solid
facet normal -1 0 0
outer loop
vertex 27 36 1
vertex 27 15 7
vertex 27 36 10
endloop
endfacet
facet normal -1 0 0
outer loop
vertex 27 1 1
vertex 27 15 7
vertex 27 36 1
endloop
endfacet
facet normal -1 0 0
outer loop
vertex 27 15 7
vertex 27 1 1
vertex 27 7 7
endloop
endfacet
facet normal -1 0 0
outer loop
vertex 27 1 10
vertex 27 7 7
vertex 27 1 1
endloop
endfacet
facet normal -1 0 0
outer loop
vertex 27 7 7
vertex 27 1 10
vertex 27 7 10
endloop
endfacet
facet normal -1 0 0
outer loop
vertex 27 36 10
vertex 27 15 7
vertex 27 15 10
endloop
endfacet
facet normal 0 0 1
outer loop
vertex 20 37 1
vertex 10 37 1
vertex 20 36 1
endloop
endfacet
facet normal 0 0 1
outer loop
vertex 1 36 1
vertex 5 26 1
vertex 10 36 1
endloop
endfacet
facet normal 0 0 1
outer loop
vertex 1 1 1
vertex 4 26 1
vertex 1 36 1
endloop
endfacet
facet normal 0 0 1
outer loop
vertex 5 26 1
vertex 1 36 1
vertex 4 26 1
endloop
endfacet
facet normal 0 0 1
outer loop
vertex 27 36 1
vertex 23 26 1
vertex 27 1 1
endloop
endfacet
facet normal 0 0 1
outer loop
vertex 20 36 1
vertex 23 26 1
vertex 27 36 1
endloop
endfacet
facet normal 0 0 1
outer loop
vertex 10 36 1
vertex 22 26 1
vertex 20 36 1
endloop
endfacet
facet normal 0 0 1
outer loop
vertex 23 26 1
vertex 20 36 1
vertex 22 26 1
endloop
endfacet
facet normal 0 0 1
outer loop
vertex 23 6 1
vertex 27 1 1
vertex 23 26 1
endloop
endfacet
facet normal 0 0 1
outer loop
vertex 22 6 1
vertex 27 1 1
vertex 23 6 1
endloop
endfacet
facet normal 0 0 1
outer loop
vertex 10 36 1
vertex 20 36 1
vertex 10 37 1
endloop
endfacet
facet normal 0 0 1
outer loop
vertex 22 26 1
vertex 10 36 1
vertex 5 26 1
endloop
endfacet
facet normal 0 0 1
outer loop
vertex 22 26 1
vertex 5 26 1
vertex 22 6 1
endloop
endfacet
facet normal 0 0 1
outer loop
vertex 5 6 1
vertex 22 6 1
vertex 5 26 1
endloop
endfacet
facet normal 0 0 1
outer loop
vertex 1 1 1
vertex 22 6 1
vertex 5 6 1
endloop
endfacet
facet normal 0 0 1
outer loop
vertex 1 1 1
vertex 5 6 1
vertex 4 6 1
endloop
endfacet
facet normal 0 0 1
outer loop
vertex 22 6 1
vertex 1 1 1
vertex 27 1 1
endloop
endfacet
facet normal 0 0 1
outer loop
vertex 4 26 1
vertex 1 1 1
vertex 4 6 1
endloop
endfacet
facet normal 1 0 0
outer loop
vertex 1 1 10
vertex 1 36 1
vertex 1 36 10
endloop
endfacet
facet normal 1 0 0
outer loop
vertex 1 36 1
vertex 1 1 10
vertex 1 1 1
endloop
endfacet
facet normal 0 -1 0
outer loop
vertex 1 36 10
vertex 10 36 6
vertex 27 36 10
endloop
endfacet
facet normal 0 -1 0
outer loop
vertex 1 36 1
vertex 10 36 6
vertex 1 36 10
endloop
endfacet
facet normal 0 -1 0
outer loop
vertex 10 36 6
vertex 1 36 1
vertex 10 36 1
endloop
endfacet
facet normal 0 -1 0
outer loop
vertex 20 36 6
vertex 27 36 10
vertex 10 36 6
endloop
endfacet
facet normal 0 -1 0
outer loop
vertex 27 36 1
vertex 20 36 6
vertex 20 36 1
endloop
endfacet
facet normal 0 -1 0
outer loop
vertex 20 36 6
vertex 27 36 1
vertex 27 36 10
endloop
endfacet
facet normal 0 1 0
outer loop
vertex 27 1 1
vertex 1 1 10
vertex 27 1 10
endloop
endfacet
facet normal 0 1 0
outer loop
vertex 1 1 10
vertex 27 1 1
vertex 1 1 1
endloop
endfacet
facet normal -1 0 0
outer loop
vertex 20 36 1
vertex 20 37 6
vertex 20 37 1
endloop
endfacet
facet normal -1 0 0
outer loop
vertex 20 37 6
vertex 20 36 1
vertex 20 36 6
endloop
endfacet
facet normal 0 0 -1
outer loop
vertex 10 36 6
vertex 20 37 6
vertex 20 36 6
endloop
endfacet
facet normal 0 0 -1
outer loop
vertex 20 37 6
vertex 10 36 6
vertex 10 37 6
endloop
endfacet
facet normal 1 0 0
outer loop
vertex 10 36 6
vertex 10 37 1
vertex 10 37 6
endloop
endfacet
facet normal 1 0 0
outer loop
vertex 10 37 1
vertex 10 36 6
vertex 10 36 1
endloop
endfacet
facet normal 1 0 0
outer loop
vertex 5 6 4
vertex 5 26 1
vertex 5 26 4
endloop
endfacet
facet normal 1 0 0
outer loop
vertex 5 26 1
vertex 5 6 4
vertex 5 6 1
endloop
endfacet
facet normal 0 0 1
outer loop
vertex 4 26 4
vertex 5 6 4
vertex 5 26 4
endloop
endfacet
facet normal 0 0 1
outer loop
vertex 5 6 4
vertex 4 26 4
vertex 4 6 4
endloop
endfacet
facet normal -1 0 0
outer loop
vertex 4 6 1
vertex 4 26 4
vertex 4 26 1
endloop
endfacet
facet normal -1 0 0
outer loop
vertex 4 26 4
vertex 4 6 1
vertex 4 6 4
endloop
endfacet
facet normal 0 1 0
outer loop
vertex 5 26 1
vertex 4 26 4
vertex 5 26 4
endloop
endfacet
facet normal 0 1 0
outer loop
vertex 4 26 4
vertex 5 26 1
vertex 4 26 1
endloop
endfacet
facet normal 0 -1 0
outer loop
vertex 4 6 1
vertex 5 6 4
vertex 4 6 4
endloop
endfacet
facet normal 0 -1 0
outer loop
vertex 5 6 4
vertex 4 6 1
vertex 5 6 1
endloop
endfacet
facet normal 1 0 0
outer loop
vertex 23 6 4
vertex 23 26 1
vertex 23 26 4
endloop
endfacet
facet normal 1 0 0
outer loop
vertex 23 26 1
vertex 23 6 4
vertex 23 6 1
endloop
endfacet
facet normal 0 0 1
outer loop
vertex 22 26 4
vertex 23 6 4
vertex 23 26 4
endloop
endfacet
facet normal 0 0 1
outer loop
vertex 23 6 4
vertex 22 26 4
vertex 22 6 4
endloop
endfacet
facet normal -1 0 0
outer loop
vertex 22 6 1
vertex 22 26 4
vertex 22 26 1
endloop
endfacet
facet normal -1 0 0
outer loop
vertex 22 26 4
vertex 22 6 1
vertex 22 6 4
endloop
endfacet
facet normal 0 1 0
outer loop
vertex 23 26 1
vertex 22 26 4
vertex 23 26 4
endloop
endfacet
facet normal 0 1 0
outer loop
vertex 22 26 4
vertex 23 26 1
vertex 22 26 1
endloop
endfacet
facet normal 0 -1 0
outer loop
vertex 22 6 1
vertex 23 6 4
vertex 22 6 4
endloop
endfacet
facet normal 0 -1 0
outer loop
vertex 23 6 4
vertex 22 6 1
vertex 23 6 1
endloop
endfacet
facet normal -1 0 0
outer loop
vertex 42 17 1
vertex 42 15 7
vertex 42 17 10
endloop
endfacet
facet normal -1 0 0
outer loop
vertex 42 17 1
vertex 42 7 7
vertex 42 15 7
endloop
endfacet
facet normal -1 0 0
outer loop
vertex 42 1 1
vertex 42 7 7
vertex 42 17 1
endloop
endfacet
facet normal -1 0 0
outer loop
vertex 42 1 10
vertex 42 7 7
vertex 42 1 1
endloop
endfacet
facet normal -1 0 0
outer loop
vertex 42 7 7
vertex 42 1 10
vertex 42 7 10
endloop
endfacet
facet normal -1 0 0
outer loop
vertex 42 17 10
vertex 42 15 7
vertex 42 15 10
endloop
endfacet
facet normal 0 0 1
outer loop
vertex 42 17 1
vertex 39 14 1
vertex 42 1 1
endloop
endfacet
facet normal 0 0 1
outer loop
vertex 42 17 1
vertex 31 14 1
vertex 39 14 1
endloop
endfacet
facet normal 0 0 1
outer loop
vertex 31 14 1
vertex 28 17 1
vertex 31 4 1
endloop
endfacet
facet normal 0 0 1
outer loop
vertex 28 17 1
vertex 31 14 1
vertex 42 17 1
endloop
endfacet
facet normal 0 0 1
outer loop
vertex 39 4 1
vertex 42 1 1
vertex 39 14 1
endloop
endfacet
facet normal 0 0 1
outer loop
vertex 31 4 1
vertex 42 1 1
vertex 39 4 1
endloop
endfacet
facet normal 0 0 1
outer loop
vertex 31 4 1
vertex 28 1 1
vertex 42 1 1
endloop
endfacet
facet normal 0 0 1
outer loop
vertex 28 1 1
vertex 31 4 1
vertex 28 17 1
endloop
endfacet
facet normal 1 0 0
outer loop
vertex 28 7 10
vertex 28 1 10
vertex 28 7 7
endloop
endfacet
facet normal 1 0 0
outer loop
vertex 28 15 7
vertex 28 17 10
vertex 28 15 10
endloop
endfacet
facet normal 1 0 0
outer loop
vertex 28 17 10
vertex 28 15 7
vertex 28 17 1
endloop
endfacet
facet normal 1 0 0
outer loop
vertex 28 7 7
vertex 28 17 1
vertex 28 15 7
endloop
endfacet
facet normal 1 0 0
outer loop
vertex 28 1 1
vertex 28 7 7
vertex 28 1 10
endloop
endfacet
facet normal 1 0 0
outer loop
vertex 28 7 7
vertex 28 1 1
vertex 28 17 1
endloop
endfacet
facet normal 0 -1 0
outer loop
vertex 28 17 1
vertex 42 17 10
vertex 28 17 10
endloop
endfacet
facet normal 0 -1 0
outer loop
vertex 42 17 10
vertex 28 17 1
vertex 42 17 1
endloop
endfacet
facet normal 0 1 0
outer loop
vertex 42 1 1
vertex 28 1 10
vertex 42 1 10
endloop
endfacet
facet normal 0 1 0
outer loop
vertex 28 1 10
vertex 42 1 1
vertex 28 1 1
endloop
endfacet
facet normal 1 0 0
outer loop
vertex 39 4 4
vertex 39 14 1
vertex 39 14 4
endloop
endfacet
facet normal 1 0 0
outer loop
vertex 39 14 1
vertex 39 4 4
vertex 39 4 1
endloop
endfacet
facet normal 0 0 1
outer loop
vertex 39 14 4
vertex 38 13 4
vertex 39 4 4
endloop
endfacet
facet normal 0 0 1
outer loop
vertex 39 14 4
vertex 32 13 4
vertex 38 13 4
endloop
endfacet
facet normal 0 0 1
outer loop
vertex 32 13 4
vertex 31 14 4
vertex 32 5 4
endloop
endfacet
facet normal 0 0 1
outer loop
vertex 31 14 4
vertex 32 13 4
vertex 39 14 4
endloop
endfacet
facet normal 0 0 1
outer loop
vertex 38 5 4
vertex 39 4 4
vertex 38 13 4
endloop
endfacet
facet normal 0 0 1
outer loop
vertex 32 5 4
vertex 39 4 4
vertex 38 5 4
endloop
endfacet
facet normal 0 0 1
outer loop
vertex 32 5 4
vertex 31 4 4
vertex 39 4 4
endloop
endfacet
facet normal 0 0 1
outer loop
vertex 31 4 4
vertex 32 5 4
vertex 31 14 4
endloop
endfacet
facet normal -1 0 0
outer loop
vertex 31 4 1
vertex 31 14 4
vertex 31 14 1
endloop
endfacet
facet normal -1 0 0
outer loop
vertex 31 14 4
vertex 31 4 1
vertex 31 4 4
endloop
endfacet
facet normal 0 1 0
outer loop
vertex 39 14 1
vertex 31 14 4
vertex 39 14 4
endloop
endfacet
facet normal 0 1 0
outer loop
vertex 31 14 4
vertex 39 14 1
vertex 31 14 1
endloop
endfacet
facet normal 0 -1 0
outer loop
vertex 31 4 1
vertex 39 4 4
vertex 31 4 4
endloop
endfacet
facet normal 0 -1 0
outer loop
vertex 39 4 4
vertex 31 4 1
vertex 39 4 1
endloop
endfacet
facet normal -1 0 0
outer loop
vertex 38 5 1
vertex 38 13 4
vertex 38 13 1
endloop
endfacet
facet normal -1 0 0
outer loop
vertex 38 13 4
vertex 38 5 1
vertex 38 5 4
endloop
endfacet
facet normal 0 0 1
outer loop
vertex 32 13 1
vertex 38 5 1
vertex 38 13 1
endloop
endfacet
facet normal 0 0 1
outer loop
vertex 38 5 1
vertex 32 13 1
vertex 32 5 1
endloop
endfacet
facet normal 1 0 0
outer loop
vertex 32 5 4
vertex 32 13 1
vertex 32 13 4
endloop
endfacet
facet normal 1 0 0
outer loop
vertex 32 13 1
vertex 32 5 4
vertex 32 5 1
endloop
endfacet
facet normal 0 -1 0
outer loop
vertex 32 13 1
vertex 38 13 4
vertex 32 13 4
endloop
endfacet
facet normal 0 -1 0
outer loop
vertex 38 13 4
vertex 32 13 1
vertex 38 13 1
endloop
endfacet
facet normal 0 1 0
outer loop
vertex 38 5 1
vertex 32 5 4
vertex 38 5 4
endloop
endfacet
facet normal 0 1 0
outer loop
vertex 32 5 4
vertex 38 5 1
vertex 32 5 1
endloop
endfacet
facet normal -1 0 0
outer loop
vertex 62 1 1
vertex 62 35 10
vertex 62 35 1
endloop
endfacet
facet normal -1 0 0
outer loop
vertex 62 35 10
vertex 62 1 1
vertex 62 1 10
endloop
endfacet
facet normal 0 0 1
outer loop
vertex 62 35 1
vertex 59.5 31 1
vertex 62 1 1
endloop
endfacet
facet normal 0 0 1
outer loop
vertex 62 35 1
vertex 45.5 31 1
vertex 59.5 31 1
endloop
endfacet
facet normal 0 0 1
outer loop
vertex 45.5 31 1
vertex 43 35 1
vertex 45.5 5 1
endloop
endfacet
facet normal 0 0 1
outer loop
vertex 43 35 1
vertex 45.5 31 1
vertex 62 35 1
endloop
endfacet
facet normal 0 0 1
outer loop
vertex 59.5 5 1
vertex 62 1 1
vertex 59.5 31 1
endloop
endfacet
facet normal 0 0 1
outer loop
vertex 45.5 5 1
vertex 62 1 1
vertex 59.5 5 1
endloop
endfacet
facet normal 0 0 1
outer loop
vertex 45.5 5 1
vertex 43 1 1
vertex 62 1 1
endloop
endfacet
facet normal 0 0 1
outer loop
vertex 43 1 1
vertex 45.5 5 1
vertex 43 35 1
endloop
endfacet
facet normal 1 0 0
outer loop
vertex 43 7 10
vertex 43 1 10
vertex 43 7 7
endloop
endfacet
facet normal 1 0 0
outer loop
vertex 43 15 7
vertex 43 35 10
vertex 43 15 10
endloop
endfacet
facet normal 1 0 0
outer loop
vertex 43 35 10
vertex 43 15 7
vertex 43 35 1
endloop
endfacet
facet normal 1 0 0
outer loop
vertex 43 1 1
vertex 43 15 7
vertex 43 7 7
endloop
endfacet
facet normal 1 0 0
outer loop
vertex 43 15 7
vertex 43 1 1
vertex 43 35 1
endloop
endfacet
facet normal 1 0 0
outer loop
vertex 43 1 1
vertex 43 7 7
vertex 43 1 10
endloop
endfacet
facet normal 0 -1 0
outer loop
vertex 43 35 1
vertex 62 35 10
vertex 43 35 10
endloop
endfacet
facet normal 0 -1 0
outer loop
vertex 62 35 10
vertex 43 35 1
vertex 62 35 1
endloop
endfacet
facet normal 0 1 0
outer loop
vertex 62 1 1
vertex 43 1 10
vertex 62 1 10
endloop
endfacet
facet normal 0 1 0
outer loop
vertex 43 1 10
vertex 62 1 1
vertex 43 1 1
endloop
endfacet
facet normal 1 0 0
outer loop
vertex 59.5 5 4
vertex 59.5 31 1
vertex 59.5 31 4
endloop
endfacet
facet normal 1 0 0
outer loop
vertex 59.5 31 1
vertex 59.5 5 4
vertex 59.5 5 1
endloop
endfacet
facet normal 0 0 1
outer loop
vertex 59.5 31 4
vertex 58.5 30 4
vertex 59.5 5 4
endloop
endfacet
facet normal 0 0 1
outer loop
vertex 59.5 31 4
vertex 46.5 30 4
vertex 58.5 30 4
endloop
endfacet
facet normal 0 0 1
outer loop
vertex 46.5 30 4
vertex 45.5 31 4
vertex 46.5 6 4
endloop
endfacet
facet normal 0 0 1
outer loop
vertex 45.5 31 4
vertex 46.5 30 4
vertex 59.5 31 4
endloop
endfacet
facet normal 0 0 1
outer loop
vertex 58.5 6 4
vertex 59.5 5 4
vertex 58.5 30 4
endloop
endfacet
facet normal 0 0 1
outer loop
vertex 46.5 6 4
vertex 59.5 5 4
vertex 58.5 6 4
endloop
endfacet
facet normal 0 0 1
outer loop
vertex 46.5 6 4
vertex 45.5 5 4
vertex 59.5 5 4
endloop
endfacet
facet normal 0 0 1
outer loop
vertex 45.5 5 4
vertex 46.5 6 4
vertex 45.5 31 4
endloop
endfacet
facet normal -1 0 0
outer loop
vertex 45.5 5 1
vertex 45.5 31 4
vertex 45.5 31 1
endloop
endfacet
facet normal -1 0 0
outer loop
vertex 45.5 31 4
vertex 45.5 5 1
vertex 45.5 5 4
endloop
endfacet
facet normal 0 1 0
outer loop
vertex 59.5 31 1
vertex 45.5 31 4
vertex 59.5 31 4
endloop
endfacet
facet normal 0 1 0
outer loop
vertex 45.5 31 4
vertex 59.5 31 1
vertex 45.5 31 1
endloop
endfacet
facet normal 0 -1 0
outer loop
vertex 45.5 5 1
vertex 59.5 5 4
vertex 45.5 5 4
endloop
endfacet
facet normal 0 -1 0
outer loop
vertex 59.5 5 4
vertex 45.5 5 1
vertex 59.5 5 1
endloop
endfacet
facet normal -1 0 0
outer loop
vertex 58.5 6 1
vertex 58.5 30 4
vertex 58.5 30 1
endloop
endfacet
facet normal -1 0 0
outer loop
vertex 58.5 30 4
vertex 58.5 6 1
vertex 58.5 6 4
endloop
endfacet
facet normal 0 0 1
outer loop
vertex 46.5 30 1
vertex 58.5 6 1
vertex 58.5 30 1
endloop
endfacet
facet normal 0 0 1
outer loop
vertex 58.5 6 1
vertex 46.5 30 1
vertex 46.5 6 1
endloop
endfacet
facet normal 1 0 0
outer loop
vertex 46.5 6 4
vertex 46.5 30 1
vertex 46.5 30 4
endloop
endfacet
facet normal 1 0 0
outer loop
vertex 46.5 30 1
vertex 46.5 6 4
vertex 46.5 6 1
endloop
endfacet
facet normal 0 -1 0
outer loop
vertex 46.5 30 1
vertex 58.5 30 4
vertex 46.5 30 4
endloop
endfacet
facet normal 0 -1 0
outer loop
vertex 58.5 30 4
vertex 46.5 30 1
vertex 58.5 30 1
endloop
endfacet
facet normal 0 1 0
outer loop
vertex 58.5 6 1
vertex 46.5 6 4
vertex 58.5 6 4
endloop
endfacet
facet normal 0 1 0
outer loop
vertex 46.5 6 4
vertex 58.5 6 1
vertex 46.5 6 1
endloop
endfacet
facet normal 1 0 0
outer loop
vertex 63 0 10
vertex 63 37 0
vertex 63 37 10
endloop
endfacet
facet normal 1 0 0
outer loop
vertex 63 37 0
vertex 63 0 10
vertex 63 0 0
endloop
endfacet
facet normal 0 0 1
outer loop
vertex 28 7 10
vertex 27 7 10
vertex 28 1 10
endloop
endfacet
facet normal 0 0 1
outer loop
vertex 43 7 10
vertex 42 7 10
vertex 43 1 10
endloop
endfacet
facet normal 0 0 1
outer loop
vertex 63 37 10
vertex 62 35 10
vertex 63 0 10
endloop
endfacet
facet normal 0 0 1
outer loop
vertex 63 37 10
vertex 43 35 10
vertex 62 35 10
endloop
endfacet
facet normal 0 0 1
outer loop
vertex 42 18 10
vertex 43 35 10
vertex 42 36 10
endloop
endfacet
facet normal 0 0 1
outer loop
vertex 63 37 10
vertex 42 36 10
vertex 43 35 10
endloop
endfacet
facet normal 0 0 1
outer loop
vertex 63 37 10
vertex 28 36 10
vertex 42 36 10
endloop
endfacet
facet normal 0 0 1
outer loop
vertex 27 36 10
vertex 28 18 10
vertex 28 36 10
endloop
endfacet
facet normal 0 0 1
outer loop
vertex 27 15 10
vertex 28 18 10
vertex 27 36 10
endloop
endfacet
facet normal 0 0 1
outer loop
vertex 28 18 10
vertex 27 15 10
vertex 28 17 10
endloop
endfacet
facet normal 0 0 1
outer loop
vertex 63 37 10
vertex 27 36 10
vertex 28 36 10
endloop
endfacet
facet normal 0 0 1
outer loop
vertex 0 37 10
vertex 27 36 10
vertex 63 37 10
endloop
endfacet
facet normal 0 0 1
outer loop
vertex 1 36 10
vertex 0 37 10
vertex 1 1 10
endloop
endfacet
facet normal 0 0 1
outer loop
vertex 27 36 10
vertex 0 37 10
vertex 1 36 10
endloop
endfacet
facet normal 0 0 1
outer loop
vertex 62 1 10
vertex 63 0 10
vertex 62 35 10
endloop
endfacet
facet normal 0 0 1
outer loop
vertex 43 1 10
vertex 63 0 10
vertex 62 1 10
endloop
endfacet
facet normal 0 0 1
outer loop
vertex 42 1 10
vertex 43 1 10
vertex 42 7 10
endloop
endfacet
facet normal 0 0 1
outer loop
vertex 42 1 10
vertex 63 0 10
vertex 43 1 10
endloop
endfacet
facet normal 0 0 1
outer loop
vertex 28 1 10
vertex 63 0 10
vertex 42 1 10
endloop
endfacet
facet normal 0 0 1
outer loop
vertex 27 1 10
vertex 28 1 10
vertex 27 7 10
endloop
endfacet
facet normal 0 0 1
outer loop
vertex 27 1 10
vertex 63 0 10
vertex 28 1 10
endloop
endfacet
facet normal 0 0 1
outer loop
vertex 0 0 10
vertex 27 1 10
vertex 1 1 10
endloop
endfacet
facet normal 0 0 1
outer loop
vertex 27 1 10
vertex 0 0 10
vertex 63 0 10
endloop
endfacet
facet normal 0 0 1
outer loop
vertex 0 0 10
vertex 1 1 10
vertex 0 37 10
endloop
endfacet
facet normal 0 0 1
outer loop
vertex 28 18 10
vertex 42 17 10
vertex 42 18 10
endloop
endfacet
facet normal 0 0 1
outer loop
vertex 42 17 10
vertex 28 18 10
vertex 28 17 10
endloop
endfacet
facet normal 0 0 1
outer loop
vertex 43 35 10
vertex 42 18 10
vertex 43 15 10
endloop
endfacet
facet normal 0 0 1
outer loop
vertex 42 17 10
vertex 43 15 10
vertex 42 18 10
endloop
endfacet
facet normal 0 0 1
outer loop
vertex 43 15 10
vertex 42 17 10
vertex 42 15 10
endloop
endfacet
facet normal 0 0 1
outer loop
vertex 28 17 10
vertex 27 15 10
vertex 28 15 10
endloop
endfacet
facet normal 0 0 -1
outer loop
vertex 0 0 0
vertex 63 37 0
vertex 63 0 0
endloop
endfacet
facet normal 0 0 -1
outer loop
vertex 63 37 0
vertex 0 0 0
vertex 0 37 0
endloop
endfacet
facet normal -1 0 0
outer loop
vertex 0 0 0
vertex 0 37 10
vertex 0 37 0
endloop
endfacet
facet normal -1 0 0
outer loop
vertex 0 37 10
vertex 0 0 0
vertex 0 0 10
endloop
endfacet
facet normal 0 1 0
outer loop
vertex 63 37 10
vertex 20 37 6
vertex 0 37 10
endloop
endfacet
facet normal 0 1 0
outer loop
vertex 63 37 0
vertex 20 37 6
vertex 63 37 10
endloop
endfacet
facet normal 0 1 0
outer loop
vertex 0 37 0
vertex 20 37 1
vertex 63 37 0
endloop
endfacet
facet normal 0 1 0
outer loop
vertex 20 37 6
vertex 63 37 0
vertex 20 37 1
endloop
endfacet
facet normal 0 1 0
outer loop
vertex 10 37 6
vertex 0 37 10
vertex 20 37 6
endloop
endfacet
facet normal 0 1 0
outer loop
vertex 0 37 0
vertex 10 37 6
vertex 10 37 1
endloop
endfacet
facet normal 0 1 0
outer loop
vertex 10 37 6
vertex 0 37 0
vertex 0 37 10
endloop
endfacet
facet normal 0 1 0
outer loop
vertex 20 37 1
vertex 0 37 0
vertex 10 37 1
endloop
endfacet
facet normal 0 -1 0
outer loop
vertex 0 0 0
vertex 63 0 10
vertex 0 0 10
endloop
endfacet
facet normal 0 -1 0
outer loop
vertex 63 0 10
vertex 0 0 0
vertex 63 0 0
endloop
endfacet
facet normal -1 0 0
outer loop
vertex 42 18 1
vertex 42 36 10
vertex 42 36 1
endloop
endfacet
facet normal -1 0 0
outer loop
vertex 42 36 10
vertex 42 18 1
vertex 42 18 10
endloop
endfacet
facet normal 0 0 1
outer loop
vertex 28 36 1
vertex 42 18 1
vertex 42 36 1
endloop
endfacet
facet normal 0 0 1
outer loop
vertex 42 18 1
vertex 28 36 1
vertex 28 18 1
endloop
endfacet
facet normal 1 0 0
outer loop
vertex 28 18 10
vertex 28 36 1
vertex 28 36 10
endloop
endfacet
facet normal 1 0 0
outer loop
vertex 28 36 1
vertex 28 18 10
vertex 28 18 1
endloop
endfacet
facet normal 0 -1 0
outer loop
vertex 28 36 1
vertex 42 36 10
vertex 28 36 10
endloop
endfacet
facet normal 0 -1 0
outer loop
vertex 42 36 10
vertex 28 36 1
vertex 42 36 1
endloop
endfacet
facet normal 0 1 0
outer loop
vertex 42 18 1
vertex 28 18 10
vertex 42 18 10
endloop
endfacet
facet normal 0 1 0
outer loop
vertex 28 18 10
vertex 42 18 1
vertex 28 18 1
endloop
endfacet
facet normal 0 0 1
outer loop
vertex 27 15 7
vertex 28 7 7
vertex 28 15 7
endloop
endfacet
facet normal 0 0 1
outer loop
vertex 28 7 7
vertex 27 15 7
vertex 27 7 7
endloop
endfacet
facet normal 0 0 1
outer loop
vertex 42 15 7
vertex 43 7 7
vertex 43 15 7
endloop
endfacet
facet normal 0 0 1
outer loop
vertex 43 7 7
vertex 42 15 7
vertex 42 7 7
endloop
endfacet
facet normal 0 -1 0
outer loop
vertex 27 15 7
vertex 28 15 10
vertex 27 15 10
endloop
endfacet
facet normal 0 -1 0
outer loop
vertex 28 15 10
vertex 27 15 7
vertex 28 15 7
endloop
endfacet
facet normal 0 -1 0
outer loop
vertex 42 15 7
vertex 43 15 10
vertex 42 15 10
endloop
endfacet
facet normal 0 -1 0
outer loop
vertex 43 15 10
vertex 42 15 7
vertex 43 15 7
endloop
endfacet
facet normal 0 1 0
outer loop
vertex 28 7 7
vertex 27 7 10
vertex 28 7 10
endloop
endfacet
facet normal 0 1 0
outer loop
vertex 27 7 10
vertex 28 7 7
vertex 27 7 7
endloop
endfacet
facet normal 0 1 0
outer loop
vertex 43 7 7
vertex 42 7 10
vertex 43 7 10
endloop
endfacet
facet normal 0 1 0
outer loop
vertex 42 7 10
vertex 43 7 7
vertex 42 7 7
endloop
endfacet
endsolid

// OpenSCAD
// OPENSCA Model for enclosure for Tine's table
// Currently 3 devices: Waatuino, 3.3v to 5v level shifter, and ESP Wemos D1 Mini
$fn = 100;
wiggle = 0.01;

// Wemos D1 Mini (26mm x 35mm, height 7mm)
module wemos() {
    difference() {
        union() {
            cube([26, 35, 10]);                       // Main board
            translate([9, 32, 0]) cube([10, 5, 5]);   // USB port area
        }
        // Side slots
        translate([3, 5, -wiggle]) cube([1, 20, 3 + wiggle]);
        translate([21, 5, -wiggle]) cube([1, 20, 3 + wiggle]);
    }
}

// Voltage level shifter (14mm x 16mm, height 7mm)
module v5v3() {
    union() {
        difference() {
            cube([14, 16, 10]);
            translate([3, 3, -wiggle]) cube([8, 10, 3 + wiggle]);  // Inner cutout
        }
        translate([4, 4, 0]) cube([6, 8, 3 + wiggle]);            // Inner block
    }
}

// Blanker module (14mm x 18mm, height 10mm)
module blanker() {
    cube([14, 18, 10]);
}

// Wattuino (Arduino 5V clone 22mm x 32mm, height 7mm)
module wattuino() {
    union() {
        difference() {
            cube([19, 34, 10]);
            translate([2.5, 4, -wiggle]) cube([14, 26, 3 + wiggle]);
        }
        translate([3.5, 5, 0]) cube([12, 24, 3 + wiggle]);
    }
}

// Outer casing (63mm x 37mm x 10mm)
module casing() {
    cube([63, 37, 10]);
}

// Cabling boom (50mm x 8mm x 3mm)
module cabling() {
    cube([50, 8, 3.01]);
}

// Enclosure assembly
module enclosure() {
    difference() {
        casing();
        translate([1, 1, 1]) wemos();
        translate([28, 1, 1]) v5v3();
        translate([43, 1, 1]) wattuino();
        translate([28, 18, 1]) blanker();
        translate([7, 7, 7]) cabling();
    }
}

enclosure();
